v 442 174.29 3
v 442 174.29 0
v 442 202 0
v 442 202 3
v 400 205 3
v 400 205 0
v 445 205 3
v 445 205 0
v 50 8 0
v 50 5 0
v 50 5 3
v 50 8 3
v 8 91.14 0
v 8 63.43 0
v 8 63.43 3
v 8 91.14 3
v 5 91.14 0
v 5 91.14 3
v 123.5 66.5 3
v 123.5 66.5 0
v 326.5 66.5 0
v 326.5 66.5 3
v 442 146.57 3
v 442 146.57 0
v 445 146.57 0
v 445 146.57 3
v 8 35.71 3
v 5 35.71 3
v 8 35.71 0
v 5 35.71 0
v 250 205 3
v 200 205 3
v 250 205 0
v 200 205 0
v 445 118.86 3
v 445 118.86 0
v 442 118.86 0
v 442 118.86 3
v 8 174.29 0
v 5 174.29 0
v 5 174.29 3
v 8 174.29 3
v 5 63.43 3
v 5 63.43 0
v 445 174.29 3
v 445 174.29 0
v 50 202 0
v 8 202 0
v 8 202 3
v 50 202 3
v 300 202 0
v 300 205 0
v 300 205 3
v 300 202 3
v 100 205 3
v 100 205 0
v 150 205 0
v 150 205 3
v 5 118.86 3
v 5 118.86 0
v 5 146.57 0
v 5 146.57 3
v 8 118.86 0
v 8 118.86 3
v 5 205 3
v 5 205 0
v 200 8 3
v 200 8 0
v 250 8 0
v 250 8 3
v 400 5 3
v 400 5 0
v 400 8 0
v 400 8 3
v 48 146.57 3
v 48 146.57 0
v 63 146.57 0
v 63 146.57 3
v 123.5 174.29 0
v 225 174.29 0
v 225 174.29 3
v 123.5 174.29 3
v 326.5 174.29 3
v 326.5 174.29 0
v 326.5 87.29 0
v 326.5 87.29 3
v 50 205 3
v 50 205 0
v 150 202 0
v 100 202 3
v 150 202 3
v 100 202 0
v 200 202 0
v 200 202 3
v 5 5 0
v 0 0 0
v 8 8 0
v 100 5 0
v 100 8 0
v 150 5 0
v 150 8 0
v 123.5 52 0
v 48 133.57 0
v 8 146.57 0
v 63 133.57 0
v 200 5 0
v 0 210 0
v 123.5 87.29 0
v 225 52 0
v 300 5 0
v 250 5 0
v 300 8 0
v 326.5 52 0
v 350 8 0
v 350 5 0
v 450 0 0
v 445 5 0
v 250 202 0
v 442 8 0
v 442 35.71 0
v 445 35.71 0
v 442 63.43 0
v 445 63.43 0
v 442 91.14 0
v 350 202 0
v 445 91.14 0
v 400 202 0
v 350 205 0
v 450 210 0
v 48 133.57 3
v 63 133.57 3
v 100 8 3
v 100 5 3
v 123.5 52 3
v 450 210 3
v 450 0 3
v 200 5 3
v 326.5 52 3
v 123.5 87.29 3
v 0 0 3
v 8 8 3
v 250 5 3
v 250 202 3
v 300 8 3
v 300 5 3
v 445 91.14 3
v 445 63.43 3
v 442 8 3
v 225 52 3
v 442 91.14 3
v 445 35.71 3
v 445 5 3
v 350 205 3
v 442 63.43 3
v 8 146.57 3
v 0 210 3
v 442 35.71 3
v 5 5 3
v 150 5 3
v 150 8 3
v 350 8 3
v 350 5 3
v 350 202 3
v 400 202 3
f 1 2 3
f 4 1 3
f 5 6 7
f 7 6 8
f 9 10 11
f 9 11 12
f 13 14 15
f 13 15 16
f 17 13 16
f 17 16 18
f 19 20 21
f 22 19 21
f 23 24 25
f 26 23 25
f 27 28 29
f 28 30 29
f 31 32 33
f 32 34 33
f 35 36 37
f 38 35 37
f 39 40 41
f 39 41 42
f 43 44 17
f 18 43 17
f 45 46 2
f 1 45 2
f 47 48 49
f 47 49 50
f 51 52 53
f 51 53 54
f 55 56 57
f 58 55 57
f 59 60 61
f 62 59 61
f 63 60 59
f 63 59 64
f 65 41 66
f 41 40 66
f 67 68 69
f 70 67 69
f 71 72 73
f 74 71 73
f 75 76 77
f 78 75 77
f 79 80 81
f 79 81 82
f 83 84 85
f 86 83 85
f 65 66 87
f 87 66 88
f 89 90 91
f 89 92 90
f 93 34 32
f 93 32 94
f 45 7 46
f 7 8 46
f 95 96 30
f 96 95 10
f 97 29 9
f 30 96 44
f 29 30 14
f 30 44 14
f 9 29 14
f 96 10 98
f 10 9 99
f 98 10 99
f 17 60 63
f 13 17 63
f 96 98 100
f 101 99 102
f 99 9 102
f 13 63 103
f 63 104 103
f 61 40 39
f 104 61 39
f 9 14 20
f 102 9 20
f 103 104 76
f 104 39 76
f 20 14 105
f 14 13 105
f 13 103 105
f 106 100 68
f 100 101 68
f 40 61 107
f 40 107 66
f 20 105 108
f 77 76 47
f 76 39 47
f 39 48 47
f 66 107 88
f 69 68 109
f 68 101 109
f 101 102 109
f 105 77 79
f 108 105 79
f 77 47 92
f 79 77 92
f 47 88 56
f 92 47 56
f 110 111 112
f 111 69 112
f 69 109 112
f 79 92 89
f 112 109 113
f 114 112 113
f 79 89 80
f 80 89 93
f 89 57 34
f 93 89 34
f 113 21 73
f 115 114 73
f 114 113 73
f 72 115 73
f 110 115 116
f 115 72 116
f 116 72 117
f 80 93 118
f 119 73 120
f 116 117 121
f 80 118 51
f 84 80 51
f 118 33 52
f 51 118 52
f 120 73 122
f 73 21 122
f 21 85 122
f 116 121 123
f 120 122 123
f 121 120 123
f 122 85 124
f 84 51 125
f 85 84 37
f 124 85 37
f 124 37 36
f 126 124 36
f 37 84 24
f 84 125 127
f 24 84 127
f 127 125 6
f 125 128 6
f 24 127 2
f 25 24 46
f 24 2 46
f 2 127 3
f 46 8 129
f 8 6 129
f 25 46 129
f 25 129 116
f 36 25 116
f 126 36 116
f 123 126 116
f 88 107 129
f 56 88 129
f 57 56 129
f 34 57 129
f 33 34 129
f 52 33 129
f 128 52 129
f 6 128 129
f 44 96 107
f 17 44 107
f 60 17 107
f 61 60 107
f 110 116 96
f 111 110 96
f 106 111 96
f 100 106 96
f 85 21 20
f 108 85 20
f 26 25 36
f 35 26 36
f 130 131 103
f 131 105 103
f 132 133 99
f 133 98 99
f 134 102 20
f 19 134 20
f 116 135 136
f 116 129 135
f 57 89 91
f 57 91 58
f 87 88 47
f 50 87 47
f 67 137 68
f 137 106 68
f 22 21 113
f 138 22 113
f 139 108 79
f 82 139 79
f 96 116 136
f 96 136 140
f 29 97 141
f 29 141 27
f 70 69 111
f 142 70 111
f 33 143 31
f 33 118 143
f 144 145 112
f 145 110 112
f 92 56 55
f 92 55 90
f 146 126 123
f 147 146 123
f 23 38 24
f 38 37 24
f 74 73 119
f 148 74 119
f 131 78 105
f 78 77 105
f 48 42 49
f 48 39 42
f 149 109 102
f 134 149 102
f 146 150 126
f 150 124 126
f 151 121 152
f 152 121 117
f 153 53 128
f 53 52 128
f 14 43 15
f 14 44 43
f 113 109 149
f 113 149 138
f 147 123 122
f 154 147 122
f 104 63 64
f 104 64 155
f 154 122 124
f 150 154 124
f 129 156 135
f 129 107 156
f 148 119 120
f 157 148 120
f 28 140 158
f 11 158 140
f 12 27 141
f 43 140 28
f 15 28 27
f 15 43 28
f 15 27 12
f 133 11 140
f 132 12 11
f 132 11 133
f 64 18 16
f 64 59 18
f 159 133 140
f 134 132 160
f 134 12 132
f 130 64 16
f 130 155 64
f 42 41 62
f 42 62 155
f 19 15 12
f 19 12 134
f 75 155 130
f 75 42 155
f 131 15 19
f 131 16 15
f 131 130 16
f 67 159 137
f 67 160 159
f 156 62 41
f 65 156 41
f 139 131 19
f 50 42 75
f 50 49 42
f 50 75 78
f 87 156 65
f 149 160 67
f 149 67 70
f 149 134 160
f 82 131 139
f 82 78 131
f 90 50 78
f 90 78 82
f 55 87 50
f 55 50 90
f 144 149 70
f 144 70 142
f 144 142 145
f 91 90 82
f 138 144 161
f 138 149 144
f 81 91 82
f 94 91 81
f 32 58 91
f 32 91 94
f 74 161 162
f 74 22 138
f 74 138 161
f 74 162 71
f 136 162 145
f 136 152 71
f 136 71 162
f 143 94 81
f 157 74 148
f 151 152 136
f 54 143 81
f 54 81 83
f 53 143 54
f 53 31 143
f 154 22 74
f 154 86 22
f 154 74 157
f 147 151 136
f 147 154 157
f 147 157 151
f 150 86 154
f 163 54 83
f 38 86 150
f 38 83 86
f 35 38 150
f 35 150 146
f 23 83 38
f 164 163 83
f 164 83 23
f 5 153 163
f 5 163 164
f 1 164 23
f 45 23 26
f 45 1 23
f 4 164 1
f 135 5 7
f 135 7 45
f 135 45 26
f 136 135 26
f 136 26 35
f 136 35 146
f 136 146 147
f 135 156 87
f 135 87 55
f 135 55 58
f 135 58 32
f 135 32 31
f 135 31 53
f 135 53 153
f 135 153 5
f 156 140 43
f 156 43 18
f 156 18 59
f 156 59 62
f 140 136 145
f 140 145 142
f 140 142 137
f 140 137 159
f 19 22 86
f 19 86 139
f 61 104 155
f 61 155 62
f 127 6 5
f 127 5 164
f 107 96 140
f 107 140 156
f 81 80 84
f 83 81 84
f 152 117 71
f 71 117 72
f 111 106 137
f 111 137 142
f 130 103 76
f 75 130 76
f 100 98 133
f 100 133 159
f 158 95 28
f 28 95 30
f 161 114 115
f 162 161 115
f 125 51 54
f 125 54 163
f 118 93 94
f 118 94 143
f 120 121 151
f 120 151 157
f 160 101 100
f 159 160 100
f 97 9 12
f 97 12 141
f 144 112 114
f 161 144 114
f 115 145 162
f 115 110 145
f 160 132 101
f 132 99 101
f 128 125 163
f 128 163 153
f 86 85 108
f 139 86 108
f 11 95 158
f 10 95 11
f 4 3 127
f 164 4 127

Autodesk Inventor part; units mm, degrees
ref_plane "YZ Plane" through (0, 0, 0) normal (1, 0, 0) x (0, 1, 0)
ref_plane "XZ Plane" through (0, 0, 0) normal (0, 1, 0) x (-1, 0, 0)
ref_plane "XY Plane" through (0, 0, 0) normal (0, 0, 1) x (1, 0, 0)
sketch "Boceto1" plane through (0, 0, 0) normal (0, 0, 1) x (1, 0, 0)
  line L0 (0, 0) -> (0, 210)
  line L1 (0, 210) -> (450, 210)
  line L2 (450, 210) -> (450, 0)
  line L3 (450, 0) -> (0, 0)
  line L4 (5, 5) -> (5, 35.71)
  line L5 (5, 5) -> (50, 5)
  line L6 (50, 5) -> (50, 8)
  line L7 (5, 35.71) -> (8, 35.71)
  line L8 (50, 8) -> (8, 8)
  line L9 (8, 8) -> (8, 35.71)
  line L10 (5, 63.43) -> (5, 91.14)
  line L11 (5, 118.86) -> (5, 146.57)
  line L12 (5, 174.29) -> (5, 205)
  line L13 (5, 205) -> (50, 205)
  line L14 (5, 63.43) -> (8, 63.43)
  line L15 (8, 63.43) -> (8, 91.14)
  line L16 (8, 91.14) -> (5, 91.14)
  line L17 (5, 118.86) -> (8, 118.86)
  line L18 (8, 118.86) -> (8, 146.57)
  line L19 (8, 146.57) -> (5, 146.57)
  line L20 (50, 205) -> (50, 202)
  line L21 (5, 174.29) -> (8, 174.29)
  line L22 (8, 174.29) -> (8, 202)
  line L23 (8, 202) -> (50, 202)
  line L24 (100, 205) -> (150, 205)
  line L25 (200, 205) -> (250, 205)
  line L26 (300, 205) -> (350, 205)
  line L27 (400, 205) -> (445, 205)
  line L28 (445, 205) -> (445, 174.29)
  line L29 (100, 205) -> (100, 202)
  line L30 (100, 202) -> (150, 202)
  line L31 (150, 202) -> (150, 205)
  line L32 (200, 205) -> (200, 202)
  line L33 (200, 202) -> (250, 202)
  line L34 (250, 202) -> (250, 205)
  line L35 (300, 205) -> (300, 202)
  line L36 (300, 202) -> (350, 202)
  line L37 (350, 202) -> (350, 205)
  line L38 (400, 205) -> (400, 202)
  line L39 (445, 174.29) -> (442, 174.29)
  line L40 (442, 174.29) -> (442, 202)
  line L41 (442, 202) -> (400, 202)
  line L42 (445, 146.57) -> (445, 118.86)
  line L43 (445, 91.14) -> (445, 63.43)
  line L44 (445, 35.71) -> (445, 5)
  line L45 (445, 5) -> (400, 5)
  line L46 (445, 35.71) -> (442, 35.71)
  line L47 (400, 5) -> (400, 8)
  line L48 (400, 8) -> (442, 8)
  line L49 (442, 8) -> (442, 35.71)
  line L50 (445, 63.43) -> (442, 63.43)
  line L51 (442, 63.43) -> (442, 91.14)
  line L52 (442, 91.14) -> (445, 91.14)
  line L53 (445, 118.86) -> (442, 118.86)
  line L54 (442, 118.86) -> (442, 146.57)
  line L55 (442, 146.57) -> (445, 146.57)
  line L56 (100, 5) -> (150, 5)
  line L57 (200, 5) -> (250, 5)
  line L58 (300, 5) -> (350, 5)
  line L59 (100, 5) -> (100, 8)
  line L60 (100, 8) -> (150, 8)
  line L61 (150, 8) -> (150, 5)
  line L62 (200, 5) -> (200, 8)
  line L63 (200, 8) -> (250, 8)
  line L64 (250, 8) -> (250, 5)
  line L65 (300, 5) -> (300, 8)
  line L66 (300, 8) -> (350, 8)
  line L67 (350, 8) -> (350, 5)
  line L68 (225, 174.29) -> (326.5, 174.29)
  line L69 (225, 174.29) -> (123.5, 174.29)
  line L70 (326.5, 174.29) -> (326.5, 87.29)
  line L71 (326.5, 87.29) -> (123.5, 87.29)
  line L72 (123.5, 87.29) -> (123.5, 174.29)
  line L73 (225, 52) -> (326.5, 52)
  line L74 (225, 52) -> (123.5, 52)
  line L75 (123.5, 52) -> (123.5, 66.5)
  line L76 (123.5, 66.5) -> (326.5, 66.5)
  line L77 (326.5, 66.5) -> (326.5, 52)
  line L78 (48, 146.57) -> (63, 146.57)
  line L79 (63, 146.57) -> (63, 133.57)
  line L80 (63, 133.57) -> (48, 133.57)
  line L81 (48, 133.57) -> (48, 146.57)
  dimension "d0" = 210
  dimension "d1" = 450
  dimension "d2" = 30.71
  dimension "d3" = 45
  dimension "d4" = 3
  dimension "d5" = 3
  dimension "d7" = 27.71
  dimension "d8" = 27.72
  dimension "d9" = 27.71
  dimension "d10" = 27.72
  dimension "d12" = 30.71
  dimension "d13" = 45
  dimension "d14" = 27.72
  dimension "d15" = 3
  dimension "d17" = 3
  dimension "d19" = 3
  dimension "d20" = 3
  dimension "d21" = 50
  dimension "d22" = 50
  dimension "d23" = 50
  dimension "d24" = 50
  dimension "d25" = 50
  dimension "d26" = 50
  dimension "d27" = 50
  dimension "d28" = 45
  dimension "d29" = 30.71
  dimension "d30" = 3
  dimension "d31" = 3
  dimension "d33" = 3
  dimension "d35" = 50
  dimension "d36" = 3
  dimension "d37" = 3
  dimension "d38" = 27.72
  dimension "d39" = 27.71
  dimension "d40" = 27.72
  dimension "d41" = 27.71
  dimension "d42" = 27.72
  dimension "d43" = 30.71
  dimension "d44" = 3
  dimension "d45" = 3
  dimension "d46" = 3
  dimension "d47" = 3
  dimension "d48" = 50
  dimension "d49" = 50
  dimension "d50" = 50
  dimension "d51" = 50
  dimension "d52" = 50
  dimension "d53" = 50
  dimension "d54" = 50
  dimension "d55" = 3
  dimension "d56" = 3
  dimension "d58" = 3
  dimension "d59" = 5
  dimension "d60" = 5
  dimension "d61" = 5
  dimension "d62" = 5
  dimension "d63" = 5
  dimension "d64" = 5
  dimension "d65" = 5
  dimension "d66" = 5
  dimension "d67" = 5
  dimension "d68" = 5
  dimension "d69" = 5
  dimension "d70" = 5
extrude "Extrusión1" add sketch "Boceto1" along normal blind 3
properties part number "Frontal Arduino" material "Madera (nogal)"
